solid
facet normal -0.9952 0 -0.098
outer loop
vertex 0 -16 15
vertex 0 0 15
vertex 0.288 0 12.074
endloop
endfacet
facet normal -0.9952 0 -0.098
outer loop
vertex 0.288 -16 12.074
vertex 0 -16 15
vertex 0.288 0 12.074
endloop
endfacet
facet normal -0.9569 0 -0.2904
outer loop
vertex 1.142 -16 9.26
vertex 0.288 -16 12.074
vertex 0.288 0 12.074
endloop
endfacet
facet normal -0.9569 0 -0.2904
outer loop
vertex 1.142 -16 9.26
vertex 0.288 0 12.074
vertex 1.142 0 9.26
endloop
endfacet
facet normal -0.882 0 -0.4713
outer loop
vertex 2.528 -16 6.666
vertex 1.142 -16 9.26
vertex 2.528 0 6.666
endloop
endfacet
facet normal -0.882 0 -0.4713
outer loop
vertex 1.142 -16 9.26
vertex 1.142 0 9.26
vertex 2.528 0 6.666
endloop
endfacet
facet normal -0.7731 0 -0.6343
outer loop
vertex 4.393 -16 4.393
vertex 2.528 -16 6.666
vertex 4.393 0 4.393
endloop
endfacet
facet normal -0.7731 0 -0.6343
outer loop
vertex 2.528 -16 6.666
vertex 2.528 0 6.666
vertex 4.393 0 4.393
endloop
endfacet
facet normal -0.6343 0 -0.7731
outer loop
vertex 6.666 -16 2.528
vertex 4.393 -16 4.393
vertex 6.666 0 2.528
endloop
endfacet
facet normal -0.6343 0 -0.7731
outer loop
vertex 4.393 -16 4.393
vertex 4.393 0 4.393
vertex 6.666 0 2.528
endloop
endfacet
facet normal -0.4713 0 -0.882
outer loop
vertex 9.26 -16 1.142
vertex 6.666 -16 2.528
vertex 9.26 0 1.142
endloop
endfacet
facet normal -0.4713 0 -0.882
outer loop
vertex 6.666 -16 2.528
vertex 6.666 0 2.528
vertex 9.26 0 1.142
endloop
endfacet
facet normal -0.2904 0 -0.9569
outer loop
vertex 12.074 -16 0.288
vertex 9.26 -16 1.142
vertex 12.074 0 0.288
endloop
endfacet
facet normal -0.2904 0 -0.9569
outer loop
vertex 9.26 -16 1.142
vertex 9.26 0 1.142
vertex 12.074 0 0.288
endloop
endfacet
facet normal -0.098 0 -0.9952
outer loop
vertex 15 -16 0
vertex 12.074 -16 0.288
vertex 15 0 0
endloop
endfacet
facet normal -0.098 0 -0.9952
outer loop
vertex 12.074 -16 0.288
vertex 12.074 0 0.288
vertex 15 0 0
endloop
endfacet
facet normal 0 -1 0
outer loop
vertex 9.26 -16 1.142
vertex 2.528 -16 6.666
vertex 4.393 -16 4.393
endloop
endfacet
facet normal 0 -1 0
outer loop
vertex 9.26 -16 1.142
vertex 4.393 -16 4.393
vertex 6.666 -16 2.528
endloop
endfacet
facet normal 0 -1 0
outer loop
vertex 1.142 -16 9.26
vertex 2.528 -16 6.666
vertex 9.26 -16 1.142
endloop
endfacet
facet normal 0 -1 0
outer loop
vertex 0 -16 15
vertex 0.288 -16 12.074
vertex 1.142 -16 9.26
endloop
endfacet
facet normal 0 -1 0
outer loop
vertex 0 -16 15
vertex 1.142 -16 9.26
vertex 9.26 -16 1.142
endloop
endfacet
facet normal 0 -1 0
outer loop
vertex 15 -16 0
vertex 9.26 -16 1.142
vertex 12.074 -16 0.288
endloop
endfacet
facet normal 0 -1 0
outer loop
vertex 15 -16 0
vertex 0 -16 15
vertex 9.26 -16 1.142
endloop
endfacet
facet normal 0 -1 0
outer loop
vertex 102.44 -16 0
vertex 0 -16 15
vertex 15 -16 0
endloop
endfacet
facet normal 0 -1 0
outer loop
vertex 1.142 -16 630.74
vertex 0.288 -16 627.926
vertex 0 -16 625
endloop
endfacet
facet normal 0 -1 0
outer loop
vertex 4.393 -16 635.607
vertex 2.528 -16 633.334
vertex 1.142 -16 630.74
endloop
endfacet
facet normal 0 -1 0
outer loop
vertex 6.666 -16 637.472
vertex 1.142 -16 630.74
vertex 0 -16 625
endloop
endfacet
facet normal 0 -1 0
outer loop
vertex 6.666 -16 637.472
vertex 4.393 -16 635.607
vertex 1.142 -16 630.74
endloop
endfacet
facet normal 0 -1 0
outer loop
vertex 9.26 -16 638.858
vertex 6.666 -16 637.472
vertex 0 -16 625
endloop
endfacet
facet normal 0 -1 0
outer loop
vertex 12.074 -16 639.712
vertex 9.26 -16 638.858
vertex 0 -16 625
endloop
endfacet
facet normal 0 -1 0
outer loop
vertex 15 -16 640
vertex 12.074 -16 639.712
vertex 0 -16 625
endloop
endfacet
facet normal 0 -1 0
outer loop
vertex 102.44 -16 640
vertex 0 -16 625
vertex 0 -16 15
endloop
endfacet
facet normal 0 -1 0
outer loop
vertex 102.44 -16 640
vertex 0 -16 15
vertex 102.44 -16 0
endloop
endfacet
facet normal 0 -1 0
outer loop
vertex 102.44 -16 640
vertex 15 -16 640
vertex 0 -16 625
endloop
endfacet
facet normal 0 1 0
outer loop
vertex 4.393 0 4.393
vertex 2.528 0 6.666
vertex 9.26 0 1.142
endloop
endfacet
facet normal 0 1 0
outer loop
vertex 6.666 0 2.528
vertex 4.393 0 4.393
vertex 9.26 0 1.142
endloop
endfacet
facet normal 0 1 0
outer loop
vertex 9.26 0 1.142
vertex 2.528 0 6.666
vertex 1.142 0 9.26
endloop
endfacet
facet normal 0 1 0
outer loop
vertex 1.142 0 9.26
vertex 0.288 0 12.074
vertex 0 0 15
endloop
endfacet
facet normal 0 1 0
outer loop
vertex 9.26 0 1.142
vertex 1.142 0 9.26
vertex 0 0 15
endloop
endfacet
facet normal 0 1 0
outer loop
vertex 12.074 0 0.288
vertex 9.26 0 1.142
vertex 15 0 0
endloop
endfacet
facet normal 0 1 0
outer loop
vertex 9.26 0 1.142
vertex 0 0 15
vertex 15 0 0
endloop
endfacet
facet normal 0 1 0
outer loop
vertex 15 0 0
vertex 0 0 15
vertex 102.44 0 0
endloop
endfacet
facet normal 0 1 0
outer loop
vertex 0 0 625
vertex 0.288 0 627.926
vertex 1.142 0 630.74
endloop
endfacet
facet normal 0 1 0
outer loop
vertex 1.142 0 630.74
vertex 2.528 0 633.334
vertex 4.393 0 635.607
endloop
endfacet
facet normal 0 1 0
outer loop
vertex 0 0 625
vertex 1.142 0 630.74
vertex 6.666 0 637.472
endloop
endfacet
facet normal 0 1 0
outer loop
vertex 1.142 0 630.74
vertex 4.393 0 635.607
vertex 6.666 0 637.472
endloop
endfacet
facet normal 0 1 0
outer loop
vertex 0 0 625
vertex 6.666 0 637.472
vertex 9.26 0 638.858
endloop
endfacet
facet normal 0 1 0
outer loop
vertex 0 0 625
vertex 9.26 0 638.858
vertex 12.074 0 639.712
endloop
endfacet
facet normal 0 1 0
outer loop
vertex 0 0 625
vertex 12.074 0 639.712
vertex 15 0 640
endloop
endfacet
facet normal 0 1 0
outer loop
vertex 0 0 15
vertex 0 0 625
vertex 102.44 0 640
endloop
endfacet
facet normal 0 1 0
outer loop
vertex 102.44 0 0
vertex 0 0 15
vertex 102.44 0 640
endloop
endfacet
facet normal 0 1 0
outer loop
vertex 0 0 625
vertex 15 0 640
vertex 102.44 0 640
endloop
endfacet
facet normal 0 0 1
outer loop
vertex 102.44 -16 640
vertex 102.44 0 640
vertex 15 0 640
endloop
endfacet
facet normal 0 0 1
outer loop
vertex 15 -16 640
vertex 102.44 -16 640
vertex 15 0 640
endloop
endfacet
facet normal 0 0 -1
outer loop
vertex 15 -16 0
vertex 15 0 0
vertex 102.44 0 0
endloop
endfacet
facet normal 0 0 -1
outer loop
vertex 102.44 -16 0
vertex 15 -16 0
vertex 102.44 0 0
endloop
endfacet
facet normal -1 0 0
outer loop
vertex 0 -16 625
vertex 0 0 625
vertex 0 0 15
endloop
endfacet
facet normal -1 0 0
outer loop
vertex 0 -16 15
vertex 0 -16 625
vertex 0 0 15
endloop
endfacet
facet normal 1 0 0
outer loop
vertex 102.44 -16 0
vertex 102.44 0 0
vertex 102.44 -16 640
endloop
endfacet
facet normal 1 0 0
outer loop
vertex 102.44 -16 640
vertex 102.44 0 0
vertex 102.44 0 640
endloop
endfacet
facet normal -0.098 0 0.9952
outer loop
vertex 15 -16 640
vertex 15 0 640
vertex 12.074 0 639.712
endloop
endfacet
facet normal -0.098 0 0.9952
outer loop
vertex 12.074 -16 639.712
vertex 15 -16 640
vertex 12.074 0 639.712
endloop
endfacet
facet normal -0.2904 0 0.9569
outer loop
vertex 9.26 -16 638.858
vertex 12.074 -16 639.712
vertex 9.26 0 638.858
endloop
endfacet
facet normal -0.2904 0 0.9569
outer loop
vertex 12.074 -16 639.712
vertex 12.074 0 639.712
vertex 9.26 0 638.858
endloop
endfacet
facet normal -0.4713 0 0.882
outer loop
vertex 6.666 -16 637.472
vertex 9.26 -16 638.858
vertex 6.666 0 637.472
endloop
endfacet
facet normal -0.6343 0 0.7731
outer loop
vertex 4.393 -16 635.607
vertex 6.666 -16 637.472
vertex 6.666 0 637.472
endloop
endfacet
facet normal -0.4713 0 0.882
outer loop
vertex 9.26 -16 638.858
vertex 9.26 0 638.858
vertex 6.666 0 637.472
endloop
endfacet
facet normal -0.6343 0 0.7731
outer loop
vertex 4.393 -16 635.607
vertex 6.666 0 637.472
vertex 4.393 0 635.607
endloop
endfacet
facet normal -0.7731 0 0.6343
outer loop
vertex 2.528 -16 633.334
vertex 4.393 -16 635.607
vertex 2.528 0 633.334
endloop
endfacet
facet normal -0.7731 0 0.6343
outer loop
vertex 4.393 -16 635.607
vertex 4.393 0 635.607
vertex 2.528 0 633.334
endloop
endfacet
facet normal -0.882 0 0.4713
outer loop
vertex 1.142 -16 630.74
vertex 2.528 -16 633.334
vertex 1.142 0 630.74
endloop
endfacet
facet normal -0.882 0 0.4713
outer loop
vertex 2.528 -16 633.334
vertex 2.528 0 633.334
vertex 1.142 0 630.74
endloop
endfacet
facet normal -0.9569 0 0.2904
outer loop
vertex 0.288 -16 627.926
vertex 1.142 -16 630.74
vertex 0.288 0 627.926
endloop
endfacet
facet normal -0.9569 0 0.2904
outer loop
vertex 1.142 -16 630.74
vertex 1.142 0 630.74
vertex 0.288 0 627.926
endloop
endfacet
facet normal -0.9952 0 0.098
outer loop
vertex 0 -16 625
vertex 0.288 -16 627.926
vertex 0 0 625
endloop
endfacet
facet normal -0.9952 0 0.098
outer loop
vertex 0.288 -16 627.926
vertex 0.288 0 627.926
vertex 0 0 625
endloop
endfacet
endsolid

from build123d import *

# Parameters (mm, degrees)
F1_DEPTH = 16


with BuildPart() as f1:
    # F0 (on Front) → F1 (new body)
    with BuildSketch(Plane.XZ):
        with BuildLine():
            Line((102.44, 640), (15, 640))
            ThreePointArc((15, 640), (4.393398, 635.606602), (0, 625))
            Line((0, 625), (0, 15))
            ThreePointArc((0, 15), (4.393398, 4.393398), (15, 0))
            Line((15, 0), (102.44, 0))
            Line((102.44, 0), (102.44, 640))
        make_face()
    extrude(amount=F1_DEPTH)


solid = f1.part
